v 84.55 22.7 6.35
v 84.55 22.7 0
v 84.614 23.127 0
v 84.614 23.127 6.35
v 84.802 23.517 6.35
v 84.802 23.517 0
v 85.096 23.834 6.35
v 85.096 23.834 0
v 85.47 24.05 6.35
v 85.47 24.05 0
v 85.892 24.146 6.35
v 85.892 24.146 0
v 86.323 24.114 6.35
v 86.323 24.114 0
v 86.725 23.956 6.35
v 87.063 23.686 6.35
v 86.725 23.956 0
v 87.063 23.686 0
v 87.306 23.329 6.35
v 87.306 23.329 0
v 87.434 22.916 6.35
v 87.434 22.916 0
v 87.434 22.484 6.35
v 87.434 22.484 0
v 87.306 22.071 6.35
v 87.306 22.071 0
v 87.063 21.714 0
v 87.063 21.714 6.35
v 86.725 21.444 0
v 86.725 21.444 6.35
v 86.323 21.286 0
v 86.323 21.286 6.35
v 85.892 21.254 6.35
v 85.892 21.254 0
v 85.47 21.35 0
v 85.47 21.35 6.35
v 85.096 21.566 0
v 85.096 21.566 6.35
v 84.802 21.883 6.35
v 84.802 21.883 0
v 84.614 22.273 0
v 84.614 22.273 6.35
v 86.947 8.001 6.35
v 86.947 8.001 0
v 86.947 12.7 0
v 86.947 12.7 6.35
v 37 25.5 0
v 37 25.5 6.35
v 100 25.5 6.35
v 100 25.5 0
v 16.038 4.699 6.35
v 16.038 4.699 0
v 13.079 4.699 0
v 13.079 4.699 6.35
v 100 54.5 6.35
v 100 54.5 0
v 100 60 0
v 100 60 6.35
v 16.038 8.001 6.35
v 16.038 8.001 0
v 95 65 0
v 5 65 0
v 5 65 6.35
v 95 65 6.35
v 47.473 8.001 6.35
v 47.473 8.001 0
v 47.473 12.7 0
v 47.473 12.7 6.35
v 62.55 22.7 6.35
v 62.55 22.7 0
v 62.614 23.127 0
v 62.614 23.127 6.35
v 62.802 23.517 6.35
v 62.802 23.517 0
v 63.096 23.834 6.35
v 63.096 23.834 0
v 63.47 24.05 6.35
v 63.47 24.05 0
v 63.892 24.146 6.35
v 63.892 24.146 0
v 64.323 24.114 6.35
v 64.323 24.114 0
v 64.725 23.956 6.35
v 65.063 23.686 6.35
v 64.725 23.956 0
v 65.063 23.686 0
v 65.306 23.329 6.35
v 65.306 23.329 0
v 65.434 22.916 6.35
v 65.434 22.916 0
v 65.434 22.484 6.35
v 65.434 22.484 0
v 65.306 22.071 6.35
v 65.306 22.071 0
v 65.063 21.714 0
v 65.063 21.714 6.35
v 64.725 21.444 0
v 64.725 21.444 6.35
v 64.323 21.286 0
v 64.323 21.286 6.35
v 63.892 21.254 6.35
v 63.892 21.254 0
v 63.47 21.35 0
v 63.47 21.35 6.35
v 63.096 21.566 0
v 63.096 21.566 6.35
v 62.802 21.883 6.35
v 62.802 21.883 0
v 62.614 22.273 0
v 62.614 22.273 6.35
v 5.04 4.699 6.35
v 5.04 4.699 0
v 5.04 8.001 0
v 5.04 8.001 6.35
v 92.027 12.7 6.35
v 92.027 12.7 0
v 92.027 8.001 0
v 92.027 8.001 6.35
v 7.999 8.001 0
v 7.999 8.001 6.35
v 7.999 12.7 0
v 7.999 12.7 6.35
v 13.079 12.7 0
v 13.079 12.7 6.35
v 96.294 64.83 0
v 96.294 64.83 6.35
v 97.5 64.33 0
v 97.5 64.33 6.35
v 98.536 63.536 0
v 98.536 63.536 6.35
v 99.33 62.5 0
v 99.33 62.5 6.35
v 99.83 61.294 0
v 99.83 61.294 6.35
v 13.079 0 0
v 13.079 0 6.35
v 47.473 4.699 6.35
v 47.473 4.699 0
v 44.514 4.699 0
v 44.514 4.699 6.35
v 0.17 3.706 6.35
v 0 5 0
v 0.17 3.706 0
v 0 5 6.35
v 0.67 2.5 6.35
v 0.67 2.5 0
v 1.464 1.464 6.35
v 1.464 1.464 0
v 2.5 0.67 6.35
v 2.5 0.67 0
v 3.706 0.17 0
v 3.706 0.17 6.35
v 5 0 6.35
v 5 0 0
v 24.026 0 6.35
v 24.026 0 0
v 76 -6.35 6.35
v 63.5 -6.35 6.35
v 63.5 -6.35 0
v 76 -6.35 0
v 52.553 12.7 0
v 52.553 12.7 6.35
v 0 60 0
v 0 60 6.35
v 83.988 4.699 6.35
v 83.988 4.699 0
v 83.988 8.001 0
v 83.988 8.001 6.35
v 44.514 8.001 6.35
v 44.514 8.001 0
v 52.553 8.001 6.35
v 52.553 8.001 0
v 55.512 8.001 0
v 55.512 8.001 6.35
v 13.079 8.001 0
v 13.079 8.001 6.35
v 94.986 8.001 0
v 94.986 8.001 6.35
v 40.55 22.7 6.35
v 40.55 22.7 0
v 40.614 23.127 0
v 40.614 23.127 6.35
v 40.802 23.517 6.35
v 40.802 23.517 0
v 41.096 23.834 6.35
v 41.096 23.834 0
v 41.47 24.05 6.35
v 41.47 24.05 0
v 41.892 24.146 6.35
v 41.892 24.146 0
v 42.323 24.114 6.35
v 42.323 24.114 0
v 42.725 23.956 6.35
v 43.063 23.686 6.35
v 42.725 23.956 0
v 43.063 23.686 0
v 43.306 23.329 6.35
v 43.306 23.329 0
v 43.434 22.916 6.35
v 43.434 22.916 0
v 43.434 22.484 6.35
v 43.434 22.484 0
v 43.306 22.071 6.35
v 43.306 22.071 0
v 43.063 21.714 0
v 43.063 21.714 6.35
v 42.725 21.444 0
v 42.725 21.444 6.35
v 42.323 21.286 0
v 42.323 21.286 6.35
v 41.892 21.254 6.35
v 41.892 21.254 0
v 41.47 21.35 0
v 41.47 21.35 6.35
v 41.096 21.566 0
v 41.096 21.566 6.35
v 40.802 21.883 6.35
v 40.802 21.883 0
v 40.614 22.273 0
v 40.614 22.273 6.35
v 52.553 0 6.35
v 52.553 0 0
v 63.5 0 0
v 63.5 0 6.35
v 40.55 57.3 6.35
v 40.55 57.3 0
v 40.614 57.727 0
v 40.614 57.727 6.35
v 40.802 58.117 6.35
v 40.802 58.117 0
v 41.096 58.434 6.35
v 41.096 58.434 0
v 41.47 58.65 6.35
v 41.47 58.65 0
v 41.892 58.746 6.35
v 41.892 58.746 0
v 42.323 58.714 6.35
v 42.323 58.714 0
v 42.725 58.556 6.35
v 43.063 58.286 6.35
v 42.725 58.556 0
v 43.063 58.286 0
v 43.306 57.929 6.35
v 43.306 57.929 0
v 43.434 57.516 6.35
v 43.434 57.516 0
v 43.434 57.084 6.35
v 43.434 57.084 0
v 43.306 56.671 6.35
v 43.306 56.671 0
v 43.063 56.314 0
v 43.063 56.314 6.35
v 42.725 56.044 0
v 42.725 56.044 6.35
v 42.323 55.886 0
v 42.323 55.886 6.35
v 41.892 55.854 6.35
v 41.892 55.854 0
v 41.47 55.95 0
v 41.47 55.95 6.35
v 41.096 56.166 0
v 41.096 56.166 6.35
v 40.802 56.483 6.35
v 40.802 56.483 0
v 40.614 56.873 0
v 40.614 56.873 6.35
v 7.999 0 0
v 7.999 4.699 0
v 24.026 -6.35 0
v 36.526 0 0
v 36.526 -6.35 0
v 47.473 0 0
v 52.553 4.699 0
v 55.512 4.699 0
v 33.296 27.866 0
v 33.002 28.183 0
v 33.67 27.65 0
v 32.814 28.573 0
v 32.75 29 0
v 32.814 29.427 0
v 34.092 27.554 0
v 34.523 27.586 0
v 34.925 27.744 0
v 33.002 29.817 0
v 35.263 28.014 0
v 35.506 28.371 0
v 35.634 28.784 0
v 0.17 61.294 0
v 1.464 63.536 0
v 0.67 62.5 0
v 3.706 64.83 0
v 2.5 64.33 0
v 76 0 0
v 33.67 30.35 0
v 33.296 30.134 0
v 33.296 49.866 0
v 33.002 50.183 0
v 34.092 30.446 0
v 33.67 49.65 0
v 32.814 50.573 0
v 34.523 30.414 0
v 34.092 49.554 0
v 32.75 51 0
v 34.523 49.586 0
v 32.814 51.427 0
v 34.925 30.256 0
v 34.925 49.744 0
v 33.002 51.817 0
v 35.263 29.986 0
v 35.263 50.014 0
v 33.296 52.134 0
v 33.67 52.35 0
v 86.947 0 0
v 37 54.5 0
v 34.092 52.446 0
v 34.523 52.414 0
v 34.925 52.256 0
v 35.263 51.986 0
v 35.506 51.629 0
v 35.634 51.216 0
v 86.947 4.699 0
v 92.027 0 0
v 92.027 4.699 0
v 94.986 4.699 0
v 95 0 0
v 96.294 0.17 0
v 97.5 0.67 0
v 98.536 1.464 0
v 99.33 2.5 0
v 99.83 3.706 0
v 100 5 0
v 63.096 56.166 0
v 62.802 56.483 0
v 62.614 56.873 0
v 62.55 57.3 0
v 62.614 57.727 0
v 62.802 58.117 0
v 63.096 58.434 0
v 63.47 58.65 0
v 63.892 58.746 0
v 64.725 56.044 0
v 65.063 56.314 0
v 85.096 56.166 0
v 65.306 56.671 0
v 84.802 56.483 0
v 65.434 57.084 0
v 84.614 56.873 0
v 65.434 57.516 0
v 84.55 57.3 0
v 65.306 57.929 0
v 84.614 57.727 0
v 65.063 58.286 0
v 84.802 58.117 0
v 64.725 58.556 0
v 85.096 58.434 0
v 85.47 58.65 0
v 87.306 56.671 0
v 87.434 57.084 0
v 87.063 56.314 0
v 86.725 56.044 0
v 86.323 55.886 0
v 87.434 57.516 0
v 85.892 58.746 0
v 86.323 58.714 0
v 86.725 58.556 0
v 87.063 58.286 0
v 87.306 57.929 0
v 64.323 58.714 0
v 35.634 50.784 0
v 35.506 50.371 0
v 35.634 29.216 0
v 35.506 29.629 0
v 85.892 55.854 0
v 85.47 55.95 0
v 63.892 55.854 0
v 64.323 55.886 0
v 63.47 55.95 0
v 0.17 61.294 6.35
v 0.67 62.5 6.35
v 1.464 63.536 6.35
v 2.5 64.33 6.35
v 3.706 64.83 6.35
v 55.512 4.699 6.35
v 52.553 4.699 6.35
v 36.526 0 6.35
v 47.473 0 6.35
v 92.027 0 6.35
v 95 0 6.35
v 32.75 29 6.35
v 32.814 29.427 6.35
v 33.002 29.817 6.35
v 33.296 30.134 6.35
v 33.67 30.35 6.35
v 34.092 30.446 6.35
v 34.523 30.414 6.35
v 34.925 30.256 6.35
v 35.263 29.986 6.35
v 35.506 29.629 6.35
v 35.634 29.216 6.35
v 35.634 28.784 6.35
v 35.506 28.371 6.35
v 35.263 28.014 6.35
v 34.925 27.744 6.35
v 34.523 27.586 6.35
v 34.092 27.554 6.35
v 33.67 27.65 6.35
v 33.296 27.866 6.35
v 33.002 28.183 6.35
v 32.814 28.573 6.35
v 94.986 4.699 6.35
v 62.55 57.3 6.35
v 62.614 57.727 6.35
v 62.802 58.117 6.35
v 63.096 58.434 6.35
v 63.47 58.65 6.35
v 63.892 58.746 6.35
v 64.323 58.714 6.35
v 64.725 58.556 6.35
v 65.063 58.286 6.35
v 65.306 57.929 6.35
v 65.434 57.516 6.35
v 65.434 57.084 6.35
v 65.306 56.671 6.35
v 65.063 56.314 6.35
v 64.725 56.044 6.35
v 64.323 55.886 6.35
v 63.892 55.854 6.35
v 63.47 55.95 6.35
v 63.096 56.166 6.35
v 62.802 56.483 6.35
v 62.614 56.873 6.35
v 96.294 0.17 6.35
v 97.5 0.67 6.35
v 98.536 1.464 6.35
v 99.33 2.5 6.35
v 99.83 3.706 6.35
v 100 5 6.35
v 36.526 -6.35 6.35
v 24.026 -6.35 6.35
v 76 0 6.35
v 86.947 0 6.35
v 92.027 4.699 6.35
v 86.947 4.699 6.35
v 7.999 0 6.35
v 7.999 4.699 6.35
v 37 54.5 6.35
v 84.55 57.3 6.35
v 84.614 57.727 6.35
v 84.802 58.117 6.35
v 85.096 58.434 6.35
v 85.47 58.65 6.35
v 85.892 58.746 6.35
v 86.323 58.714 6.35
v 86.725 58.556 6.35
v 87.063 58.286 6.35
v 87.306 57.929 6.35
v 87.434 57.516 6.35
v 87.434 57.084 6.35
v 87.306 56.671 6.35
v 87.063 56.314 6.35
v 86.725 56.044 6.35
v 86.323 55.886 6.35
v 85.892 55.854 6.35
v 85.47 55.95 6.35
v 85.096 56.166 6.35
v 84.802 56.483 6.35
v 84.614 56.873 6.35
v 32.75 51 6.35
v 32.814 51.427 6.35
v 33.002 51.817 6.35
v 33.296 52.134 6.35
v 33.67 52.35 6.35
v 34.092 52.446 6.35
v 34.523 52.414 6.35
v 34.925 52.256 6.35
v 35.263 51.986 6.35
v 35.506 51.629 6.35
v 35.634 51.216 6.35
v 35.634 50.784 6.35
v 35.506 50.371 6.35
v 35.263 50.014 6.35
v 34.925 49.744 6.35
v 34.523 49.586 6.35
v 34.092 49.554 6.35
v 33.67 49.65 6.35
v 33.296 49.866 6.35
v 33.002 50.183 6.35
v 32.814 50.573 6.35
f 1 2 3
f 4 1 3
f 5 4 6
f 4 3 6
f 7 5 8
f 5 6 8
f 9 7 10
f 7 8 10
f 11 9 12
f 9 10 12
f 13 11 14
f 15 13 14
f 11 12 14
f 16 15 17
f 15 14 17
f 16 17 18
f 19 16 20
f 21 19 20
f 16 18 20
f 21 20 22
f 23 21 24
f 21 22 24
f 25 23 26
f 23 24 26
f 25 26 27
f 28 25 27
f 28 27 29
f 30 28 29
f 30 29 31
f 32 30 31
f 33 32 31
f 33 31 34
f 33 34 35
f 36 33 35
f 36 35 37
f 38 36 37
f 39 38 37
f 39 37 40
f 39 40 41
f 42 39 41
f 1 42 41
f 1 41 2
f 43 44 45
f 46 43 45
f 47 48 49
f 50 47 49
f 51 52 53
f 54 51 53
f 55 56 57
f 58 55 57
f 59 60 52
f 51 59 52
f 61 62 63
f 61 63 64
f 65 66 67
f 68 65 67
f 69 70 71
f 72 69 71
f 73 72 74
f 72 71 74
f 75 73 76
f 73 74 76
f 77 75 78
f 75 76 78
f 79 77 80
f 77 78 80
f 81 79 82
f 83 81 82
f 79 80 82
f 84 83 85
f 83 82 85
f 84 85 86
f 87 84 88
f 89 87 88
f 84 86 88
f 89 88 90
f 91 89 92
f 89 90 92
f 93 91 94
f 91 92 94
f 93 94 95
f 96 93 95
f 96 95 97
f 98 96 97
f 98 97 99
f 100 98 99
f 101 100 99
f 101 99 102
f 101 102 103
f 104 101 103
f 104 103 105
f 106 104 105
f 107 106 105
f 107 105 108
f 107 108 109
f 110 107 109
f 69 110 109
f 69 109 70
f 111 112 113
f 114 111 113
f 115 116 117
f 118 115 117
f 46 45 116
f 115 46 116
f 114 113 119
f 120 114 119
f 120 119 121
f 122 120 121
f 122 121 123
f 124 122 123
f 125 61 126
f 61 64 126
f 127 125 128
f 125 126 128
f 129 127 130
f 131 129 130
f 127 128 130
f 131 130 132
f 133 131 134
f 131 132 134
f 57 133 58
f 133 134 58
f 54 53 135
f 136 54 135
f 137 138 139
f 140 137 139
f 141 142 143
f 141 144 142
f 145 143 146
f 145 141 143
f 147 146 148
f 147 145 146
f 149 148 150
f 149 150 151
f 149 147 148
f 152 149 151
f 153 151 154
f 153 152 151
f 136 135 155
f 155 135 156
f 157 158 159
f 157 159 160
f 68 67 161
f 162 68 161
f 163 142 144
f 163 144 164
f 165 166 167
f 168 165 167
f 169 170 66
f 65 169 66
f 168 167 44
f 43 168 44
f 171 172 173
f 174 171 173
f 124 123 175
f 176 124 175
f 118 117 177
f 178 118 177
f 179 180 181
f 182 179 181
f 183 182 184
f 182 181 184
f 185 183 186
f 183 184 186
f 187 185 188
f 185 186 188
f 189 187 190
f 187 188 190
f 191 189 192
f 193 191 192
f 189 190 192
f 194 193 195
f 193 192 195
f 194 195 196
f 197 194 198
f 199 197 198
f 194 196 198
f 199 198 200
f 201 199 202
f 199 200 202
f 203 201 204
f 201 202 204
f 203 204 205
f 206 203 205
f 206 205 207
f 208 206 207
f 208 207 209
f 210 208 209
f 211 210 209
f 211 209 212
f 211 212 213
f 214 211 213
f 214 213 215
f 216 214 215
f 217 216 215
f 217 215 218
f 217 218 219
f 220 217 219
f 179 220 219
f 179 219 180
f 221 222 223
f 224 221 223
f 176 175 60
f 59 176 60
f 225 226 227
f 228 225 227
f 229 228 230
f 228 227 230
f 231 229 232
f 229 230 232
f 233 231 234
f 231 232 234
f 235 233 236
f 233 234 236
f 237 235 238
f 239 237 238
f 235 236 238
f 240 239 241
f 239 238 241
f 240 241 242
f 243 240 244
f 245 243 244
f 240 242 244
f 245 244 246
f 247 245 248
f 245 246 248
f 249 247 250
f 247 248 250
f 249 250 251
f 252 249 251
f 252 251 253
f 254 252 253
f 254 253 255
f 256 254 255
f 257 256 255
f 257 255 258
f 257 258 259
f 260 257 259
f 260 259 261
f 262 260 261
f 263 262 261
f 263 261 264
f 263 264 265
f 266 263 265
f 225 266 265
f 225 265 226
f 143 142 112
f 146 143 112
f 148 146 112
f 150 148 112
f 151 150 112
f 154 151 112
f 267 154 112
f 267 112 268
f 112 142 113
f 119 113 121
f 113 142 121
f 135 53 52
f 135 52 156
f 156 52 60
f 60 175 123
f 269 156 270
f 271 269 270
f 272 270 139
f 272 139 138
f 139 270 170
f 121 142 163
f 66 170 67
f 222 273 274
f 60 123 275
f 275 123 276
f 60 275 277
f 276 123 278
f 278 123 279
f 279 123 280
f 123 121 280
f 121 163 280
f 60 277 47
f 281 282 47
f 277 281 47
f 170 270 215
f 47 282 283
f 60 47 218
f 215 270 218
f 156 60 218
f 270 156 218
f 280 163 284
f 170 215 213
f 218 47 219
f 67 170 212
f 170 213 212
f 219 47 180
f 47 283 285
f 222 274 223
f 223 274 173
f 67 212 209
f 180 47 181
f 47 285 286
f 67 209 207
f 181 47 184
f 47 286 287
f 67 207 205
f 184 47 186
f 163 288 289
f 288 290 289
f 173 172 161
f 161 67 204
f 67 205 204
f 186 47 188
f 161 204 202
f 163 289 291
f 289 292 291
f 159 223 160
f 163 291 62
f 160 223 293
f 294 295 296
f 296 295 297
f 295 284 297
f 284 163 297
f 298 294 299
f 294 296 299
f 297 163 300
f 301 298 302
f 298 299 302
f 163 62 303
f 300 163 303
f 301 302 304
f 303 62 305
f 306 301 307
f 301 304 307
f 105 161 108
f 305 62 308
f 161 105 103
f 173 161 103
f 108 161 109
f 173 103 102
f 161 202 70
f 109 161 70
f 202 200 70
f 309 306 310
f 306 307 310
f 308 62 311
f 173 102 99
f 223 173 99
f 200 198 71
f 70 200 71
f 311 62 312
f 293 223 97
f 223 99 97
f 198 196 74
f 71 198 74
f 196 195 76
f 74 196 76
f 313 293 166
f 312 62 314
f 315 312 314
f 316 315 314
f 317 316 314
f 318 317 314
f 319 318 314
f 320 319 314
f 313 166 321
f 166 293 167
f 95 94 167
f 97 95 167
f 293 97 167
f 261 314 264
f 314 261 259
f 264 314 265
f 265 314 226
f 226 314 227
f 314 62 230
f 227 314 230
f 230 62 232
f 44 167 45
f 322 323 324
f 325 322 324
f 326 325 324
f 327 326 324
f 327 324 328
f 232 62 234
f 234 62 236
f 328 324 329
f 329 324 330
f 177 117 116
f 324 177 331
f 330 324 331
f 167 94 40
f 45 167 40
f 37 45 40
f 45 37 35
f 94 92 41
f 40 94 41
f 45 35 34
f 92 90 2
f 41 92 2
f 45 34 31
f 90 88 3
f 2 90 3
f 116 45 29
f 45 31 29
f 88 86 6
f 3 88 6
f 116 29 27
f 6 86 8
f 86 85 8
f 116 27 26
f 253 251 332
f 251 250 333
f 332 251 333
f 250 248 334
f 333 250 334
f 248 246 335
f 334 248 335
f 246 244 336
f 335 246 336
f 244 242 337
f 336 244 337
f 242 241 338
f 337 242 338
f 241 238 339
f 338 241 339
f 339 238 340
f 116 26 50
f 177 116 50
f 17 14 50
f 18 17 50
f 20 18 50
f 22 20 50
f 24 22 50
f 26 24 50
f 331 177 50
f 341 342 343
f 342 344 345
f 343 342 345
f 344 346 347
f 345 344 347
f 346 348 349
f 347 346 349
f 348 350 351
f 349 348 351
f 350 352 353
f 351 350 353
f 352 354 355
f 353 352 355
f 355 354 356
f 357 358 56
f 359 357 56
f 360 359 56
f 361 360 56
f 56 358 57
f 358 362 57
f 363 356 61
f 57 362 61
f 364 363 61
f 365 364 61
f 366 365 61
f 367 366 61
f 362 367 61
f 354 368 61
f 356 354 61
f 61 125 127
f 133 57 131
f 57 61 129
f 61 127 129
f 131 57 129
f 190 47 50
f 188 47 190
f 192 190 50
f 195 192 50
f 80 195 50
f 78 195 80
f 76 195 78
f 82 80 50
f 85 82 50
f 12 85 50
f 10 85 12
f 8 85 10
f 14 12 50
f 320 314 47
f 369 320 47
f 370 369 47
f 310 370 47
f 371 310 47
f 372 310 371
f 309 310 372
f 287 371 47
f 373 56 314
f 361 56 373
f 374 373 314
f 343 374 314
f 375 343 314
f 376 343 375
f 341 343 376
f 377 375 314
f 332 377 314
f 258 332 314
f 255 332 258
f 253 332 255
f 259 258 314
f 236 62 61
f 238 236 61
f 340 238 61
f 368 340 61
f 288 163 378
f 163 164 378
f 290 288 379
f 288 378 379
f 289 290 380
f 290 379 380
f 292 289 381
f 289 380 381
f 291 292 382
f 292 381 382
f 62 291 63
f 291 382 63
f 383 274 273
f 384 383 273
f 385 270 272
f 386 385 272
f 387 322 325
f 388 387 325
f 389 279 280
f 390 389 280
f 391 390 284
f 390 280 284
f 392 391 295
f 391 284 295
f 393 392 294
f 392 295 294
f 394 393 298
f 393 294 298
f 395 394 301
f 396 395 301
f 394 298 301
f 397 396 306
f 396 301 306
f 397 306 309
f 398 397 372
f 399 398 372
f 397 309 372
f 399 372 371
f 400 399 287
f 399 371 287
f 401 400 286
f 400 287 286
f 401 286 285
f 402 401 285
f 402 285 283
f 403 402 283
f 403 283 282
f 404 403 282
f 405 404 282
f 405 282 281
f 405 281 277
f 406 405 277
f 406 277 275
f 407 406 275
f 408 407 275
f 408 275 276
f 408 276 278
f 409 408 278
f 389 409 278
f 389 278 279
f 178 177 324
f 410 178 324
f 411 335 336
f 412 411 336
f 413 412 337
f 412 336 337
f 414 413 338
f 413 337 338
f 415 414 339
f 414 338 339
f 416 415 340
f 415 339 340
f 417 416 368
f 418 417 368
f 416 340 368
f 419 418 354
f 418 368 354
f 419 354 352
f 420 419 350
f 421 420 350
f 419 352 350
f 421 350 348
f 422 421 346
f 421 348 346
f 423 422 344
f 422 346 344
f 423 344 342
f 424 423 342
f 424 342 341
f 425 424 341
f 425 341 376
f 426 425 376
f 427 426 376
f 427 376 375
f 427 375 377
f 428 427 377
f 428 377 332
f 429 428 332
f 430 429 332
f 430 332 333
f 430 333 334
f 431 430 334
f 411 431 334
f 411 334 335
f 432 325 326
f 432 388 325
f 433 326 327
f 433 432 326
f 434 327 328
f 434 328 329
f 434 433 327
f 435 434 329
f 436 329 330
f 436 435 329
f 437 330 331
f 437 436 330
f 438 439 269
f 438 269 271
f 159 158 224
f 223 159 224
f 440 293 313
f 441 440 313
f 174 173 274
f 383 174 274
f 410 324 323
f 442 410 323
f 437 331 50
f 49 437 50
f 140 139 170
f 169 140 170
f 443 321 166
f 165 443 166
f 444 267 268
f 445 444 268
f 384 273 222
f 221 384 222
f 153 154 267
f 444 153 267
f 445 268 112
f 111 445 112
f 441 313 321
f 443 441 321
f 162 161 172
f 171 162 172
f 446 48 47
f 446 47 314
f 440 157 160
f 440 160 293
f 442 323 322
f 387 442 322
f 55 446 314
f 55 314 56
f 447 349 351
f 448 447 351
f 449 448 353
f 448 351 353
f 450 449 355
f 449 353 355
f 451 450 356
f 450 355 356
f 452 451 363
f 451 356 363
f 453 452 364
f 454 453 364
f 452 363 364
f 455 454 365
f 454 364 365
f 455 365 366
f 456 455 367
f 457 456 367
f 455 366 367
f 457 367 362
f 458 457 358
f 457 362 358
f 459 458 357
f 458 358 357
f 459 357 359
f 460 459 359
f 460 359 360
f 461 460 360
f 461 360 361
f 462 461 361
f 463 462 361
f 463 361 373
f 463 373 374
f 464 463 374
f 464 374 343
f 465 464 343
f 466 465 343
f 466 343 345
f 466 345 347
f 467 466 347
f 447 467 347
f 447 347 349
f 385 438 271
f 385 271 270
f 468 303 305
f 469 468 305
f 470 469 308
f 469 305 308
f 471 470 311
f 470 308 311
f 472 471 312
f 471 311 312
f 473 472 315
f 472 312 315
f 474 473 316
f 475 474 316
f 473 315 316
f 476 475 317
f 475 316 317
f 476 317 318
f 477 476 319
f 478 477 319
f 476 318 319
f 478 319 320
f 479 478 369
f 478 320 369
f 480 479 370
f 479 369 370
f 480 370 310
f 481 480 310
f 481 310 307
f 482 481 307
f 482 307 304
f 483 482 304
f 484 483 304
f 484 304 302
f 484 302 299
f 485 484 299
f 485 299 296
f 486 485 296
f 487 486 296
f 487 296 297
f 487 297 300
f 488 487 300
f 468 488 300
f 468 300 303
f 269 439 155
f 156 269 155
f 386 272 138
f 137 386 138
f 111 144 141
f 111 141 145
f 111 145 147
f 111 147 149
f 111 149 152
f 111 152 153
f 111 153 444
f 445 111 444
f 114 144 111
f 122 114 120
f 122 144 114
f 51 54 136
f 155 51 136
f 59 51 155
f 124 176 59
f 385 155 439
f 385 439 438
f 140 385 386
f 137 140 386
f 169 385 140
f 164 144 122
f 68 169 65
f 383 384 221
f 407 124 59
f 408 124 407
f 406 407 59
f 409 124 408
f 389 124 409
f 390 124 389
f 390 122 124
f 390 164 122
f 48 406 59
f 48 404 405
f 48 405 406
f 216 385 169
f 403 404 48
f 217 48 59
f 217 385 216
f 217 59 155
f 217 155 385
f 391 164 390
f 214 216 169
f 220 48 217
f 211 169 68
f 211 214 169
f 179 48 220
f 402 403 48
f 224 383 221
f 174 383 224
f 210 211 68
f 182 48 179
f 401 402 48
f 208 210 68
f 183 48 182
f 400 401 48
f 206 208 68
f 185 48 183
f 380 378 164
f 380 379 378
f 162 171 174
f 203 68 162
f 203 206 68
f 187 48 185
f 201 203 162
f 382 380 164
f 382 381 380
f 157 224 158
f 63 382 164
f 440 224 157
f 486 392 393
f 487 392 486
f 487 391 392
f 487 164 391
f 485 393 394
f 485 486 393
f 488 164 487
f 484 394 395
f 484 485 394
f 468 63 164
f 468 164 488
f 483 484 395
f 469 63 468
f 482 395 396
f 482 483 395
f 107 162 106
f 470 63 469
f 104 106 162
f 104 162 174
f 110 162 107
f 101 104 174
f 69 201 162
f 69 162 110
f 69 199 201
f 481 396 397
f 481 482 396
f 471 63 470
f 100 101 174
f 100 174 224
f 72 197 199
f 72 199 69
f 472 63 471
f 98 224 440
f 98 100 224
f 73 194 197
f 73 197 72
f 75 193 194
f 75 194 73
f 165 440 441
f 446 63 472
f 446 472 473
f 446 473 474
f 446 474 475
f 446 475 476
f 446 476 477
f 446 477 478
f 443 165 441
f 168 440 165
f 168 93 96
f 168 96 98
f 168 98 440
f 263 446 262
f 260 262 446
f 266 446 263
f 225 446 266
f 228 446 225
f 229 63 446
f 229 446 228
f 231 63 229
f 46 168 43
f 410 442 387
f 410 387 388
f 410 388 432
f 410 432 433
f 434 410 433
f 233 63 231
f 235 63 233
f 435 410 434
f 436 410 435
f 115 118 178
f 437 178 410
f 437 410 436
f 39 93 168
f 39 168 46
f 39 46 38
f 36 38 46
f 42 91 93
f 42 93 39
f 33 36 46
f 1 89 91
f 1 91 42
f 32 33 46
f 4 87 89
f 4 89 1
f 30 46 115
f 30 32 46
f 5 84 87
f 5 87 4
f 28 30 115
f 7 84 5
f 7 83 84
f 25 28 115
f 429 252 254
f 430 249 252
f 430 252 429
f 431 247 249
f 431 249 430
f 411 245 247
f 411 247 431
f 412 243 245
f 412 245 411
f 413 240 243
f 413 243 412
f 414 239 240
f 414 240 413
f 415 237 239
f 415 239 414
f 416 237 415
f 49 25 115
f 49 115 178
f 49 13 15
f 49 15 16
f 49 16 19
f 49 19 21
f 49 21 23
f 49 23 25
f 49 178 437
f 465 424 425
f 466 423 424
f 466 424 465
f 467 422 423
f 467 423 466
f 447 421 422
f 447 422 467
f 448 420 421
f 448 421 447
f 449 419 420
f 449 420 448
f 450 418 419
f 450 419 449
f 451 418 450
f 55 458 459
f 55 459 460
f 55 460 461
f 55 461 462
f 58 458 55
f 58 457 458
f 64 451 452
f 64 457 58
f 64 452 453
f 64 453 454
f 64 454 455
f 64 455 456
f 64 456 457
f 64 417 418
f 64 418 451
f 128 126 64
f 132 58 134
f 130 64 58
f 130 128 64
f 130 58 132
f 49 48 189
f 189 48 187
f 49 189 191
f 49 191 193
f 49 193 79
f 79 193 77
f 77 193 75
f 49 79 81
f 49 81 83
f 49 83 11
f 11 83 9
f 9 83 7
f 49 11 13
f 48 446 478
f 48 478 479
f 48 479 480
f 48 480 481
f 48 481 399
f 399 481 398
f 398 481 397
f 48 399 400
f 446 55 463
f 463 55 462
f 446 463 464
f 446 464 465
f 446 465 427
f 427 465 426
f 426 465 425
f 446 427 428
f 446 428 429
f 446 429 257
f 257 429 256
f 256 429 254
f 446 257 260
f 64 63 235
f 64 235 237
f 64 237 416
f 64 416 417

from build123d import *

# Parameters (mm, degrees)
SKETCH1_W              = 100
SKETCH1_H              = 65
BOSS_EXTRUDE1_DEPTH    = 6.35
M2_5_CLEARANCE_HOLE1_D = 2.9
SKETCH4_W              = 63
SKETCH4_H              = 29
CUT_EXTRUDE1_DEPTH     = 120.43752551
FILLET2_R              = 5
SKETCH5_W              = 12.5
SKETCH5_H              = 6.35
BOSS_EXTRUDE2_DEPTH    = 6.35
CUT_EXTRUDE2_DEPTH     = 120.43752551


with BuildPart() as part:
    # Sketch1 → Boss-Extrude1 (new body)
    with BuildSketch(Plane.XY):
        with Locations((50, 32.5)):
            Rectangle(SKETCH1_W, SKETCH1_H)
    extrude(amount=BOSS_EXTRUDE1_DEPTH)

    # M2.5 Clearance Hole1 (through all)
    with Locations(Plane.XY.offset(6.35)):
        with Locations((86, 57.3), (64, 57.3), (42, 57.3), (34.2, 51), (86, 22.7), (64, 22.7), (42, 22.7), (34.2, 29)):
            Hole(M2_5_CLEARANCE_HOLE1_D / 2)

    # Sketch4 → Cut-Extrude1 (cut, through all)
    with BuildSketch(Plane.XY.offset(6.35)):
        with Locations((68.5, 40)):
            Rectangle(SKETCH4_W, SKETCH4_H)
    extrude(amount=-CUT_EXTRUDE1_DEPTH, mode=Mode.SUBTRACT)

    # Fillet2
    fillet2_edges = [part.edges().sort_by_distance(p)[0] for p in [
        (0, 65, 3.175),
        (100, 65, 3.175),
        (100, 0, 3.175),
        (0, 0, 3.175),
    ]]
    fillet(fillet2_edges, radius=FILLET2_R)

    # Sketch5 → Boss-Extrude2 (add)
    with BuildSketch(Plane.XY.offset(6.35)):
        with Locations((69.75, -3.175)):
            Rectangle(SKETCH5_W, SKETCH5_H)
        with Locations((30.2758, -3.175)):
            Rectangle(SKETCH5_W, SKETCH5_H)
    extrude(amount=-BOSS_EXTRUDE2_DEPTH)

    # Sketch7 → Cut-Extrude2 (cut, through all)
    with BuildSketch(Plane(origin=(0, 0, 0), x_dir=(-1, 0, 0), z_dir=(0, 0, -1))):
        Polygon((-92.0271, 4.699), (-92.0271, 0), (-86.9471, 0), (-86.9471, 4.699), (-83.988, 4.699), (-83.988, 8.001), (-86.9471, 8.001), (-86.9471, 12.7), (-92.0271, 12.7), (-92.0271, 8.001), (-94.9862, 8.001), (-94.9862, 4.699), align=None)
        Polygon((-52.5529, 4.699), (-52.5529, 0), (-47.4729, 0), (-47.4729, 4.699), (-44.5138, 4.699), (-44.5138, 8.001), (-47.4729, 8.001), (-47.4729, 12.7), (-52.5529, 12.7), (-52.5529, 8.001), (-55.512, 8.001), (-55.512, 4.699), align=None)
        Polygon((-13.0787, 4.699), (-13.0787, 0), (-7.9987, 0), (-7.9987, 4.699), (-5.0396, 4.699), (-5.0396, 8.001), (-7.9987, 8.001), (-7.9987, 12.7), (-13.0787, 12.7), (-13.0787, 8.001), (-16.0378, 8.001), (-16.0378, 4.699), align=None)
    extrude(amount=-CUT_EXTRUDE2_DEPTH, mode=Mode.SUBTRACT)


solid = part.part
